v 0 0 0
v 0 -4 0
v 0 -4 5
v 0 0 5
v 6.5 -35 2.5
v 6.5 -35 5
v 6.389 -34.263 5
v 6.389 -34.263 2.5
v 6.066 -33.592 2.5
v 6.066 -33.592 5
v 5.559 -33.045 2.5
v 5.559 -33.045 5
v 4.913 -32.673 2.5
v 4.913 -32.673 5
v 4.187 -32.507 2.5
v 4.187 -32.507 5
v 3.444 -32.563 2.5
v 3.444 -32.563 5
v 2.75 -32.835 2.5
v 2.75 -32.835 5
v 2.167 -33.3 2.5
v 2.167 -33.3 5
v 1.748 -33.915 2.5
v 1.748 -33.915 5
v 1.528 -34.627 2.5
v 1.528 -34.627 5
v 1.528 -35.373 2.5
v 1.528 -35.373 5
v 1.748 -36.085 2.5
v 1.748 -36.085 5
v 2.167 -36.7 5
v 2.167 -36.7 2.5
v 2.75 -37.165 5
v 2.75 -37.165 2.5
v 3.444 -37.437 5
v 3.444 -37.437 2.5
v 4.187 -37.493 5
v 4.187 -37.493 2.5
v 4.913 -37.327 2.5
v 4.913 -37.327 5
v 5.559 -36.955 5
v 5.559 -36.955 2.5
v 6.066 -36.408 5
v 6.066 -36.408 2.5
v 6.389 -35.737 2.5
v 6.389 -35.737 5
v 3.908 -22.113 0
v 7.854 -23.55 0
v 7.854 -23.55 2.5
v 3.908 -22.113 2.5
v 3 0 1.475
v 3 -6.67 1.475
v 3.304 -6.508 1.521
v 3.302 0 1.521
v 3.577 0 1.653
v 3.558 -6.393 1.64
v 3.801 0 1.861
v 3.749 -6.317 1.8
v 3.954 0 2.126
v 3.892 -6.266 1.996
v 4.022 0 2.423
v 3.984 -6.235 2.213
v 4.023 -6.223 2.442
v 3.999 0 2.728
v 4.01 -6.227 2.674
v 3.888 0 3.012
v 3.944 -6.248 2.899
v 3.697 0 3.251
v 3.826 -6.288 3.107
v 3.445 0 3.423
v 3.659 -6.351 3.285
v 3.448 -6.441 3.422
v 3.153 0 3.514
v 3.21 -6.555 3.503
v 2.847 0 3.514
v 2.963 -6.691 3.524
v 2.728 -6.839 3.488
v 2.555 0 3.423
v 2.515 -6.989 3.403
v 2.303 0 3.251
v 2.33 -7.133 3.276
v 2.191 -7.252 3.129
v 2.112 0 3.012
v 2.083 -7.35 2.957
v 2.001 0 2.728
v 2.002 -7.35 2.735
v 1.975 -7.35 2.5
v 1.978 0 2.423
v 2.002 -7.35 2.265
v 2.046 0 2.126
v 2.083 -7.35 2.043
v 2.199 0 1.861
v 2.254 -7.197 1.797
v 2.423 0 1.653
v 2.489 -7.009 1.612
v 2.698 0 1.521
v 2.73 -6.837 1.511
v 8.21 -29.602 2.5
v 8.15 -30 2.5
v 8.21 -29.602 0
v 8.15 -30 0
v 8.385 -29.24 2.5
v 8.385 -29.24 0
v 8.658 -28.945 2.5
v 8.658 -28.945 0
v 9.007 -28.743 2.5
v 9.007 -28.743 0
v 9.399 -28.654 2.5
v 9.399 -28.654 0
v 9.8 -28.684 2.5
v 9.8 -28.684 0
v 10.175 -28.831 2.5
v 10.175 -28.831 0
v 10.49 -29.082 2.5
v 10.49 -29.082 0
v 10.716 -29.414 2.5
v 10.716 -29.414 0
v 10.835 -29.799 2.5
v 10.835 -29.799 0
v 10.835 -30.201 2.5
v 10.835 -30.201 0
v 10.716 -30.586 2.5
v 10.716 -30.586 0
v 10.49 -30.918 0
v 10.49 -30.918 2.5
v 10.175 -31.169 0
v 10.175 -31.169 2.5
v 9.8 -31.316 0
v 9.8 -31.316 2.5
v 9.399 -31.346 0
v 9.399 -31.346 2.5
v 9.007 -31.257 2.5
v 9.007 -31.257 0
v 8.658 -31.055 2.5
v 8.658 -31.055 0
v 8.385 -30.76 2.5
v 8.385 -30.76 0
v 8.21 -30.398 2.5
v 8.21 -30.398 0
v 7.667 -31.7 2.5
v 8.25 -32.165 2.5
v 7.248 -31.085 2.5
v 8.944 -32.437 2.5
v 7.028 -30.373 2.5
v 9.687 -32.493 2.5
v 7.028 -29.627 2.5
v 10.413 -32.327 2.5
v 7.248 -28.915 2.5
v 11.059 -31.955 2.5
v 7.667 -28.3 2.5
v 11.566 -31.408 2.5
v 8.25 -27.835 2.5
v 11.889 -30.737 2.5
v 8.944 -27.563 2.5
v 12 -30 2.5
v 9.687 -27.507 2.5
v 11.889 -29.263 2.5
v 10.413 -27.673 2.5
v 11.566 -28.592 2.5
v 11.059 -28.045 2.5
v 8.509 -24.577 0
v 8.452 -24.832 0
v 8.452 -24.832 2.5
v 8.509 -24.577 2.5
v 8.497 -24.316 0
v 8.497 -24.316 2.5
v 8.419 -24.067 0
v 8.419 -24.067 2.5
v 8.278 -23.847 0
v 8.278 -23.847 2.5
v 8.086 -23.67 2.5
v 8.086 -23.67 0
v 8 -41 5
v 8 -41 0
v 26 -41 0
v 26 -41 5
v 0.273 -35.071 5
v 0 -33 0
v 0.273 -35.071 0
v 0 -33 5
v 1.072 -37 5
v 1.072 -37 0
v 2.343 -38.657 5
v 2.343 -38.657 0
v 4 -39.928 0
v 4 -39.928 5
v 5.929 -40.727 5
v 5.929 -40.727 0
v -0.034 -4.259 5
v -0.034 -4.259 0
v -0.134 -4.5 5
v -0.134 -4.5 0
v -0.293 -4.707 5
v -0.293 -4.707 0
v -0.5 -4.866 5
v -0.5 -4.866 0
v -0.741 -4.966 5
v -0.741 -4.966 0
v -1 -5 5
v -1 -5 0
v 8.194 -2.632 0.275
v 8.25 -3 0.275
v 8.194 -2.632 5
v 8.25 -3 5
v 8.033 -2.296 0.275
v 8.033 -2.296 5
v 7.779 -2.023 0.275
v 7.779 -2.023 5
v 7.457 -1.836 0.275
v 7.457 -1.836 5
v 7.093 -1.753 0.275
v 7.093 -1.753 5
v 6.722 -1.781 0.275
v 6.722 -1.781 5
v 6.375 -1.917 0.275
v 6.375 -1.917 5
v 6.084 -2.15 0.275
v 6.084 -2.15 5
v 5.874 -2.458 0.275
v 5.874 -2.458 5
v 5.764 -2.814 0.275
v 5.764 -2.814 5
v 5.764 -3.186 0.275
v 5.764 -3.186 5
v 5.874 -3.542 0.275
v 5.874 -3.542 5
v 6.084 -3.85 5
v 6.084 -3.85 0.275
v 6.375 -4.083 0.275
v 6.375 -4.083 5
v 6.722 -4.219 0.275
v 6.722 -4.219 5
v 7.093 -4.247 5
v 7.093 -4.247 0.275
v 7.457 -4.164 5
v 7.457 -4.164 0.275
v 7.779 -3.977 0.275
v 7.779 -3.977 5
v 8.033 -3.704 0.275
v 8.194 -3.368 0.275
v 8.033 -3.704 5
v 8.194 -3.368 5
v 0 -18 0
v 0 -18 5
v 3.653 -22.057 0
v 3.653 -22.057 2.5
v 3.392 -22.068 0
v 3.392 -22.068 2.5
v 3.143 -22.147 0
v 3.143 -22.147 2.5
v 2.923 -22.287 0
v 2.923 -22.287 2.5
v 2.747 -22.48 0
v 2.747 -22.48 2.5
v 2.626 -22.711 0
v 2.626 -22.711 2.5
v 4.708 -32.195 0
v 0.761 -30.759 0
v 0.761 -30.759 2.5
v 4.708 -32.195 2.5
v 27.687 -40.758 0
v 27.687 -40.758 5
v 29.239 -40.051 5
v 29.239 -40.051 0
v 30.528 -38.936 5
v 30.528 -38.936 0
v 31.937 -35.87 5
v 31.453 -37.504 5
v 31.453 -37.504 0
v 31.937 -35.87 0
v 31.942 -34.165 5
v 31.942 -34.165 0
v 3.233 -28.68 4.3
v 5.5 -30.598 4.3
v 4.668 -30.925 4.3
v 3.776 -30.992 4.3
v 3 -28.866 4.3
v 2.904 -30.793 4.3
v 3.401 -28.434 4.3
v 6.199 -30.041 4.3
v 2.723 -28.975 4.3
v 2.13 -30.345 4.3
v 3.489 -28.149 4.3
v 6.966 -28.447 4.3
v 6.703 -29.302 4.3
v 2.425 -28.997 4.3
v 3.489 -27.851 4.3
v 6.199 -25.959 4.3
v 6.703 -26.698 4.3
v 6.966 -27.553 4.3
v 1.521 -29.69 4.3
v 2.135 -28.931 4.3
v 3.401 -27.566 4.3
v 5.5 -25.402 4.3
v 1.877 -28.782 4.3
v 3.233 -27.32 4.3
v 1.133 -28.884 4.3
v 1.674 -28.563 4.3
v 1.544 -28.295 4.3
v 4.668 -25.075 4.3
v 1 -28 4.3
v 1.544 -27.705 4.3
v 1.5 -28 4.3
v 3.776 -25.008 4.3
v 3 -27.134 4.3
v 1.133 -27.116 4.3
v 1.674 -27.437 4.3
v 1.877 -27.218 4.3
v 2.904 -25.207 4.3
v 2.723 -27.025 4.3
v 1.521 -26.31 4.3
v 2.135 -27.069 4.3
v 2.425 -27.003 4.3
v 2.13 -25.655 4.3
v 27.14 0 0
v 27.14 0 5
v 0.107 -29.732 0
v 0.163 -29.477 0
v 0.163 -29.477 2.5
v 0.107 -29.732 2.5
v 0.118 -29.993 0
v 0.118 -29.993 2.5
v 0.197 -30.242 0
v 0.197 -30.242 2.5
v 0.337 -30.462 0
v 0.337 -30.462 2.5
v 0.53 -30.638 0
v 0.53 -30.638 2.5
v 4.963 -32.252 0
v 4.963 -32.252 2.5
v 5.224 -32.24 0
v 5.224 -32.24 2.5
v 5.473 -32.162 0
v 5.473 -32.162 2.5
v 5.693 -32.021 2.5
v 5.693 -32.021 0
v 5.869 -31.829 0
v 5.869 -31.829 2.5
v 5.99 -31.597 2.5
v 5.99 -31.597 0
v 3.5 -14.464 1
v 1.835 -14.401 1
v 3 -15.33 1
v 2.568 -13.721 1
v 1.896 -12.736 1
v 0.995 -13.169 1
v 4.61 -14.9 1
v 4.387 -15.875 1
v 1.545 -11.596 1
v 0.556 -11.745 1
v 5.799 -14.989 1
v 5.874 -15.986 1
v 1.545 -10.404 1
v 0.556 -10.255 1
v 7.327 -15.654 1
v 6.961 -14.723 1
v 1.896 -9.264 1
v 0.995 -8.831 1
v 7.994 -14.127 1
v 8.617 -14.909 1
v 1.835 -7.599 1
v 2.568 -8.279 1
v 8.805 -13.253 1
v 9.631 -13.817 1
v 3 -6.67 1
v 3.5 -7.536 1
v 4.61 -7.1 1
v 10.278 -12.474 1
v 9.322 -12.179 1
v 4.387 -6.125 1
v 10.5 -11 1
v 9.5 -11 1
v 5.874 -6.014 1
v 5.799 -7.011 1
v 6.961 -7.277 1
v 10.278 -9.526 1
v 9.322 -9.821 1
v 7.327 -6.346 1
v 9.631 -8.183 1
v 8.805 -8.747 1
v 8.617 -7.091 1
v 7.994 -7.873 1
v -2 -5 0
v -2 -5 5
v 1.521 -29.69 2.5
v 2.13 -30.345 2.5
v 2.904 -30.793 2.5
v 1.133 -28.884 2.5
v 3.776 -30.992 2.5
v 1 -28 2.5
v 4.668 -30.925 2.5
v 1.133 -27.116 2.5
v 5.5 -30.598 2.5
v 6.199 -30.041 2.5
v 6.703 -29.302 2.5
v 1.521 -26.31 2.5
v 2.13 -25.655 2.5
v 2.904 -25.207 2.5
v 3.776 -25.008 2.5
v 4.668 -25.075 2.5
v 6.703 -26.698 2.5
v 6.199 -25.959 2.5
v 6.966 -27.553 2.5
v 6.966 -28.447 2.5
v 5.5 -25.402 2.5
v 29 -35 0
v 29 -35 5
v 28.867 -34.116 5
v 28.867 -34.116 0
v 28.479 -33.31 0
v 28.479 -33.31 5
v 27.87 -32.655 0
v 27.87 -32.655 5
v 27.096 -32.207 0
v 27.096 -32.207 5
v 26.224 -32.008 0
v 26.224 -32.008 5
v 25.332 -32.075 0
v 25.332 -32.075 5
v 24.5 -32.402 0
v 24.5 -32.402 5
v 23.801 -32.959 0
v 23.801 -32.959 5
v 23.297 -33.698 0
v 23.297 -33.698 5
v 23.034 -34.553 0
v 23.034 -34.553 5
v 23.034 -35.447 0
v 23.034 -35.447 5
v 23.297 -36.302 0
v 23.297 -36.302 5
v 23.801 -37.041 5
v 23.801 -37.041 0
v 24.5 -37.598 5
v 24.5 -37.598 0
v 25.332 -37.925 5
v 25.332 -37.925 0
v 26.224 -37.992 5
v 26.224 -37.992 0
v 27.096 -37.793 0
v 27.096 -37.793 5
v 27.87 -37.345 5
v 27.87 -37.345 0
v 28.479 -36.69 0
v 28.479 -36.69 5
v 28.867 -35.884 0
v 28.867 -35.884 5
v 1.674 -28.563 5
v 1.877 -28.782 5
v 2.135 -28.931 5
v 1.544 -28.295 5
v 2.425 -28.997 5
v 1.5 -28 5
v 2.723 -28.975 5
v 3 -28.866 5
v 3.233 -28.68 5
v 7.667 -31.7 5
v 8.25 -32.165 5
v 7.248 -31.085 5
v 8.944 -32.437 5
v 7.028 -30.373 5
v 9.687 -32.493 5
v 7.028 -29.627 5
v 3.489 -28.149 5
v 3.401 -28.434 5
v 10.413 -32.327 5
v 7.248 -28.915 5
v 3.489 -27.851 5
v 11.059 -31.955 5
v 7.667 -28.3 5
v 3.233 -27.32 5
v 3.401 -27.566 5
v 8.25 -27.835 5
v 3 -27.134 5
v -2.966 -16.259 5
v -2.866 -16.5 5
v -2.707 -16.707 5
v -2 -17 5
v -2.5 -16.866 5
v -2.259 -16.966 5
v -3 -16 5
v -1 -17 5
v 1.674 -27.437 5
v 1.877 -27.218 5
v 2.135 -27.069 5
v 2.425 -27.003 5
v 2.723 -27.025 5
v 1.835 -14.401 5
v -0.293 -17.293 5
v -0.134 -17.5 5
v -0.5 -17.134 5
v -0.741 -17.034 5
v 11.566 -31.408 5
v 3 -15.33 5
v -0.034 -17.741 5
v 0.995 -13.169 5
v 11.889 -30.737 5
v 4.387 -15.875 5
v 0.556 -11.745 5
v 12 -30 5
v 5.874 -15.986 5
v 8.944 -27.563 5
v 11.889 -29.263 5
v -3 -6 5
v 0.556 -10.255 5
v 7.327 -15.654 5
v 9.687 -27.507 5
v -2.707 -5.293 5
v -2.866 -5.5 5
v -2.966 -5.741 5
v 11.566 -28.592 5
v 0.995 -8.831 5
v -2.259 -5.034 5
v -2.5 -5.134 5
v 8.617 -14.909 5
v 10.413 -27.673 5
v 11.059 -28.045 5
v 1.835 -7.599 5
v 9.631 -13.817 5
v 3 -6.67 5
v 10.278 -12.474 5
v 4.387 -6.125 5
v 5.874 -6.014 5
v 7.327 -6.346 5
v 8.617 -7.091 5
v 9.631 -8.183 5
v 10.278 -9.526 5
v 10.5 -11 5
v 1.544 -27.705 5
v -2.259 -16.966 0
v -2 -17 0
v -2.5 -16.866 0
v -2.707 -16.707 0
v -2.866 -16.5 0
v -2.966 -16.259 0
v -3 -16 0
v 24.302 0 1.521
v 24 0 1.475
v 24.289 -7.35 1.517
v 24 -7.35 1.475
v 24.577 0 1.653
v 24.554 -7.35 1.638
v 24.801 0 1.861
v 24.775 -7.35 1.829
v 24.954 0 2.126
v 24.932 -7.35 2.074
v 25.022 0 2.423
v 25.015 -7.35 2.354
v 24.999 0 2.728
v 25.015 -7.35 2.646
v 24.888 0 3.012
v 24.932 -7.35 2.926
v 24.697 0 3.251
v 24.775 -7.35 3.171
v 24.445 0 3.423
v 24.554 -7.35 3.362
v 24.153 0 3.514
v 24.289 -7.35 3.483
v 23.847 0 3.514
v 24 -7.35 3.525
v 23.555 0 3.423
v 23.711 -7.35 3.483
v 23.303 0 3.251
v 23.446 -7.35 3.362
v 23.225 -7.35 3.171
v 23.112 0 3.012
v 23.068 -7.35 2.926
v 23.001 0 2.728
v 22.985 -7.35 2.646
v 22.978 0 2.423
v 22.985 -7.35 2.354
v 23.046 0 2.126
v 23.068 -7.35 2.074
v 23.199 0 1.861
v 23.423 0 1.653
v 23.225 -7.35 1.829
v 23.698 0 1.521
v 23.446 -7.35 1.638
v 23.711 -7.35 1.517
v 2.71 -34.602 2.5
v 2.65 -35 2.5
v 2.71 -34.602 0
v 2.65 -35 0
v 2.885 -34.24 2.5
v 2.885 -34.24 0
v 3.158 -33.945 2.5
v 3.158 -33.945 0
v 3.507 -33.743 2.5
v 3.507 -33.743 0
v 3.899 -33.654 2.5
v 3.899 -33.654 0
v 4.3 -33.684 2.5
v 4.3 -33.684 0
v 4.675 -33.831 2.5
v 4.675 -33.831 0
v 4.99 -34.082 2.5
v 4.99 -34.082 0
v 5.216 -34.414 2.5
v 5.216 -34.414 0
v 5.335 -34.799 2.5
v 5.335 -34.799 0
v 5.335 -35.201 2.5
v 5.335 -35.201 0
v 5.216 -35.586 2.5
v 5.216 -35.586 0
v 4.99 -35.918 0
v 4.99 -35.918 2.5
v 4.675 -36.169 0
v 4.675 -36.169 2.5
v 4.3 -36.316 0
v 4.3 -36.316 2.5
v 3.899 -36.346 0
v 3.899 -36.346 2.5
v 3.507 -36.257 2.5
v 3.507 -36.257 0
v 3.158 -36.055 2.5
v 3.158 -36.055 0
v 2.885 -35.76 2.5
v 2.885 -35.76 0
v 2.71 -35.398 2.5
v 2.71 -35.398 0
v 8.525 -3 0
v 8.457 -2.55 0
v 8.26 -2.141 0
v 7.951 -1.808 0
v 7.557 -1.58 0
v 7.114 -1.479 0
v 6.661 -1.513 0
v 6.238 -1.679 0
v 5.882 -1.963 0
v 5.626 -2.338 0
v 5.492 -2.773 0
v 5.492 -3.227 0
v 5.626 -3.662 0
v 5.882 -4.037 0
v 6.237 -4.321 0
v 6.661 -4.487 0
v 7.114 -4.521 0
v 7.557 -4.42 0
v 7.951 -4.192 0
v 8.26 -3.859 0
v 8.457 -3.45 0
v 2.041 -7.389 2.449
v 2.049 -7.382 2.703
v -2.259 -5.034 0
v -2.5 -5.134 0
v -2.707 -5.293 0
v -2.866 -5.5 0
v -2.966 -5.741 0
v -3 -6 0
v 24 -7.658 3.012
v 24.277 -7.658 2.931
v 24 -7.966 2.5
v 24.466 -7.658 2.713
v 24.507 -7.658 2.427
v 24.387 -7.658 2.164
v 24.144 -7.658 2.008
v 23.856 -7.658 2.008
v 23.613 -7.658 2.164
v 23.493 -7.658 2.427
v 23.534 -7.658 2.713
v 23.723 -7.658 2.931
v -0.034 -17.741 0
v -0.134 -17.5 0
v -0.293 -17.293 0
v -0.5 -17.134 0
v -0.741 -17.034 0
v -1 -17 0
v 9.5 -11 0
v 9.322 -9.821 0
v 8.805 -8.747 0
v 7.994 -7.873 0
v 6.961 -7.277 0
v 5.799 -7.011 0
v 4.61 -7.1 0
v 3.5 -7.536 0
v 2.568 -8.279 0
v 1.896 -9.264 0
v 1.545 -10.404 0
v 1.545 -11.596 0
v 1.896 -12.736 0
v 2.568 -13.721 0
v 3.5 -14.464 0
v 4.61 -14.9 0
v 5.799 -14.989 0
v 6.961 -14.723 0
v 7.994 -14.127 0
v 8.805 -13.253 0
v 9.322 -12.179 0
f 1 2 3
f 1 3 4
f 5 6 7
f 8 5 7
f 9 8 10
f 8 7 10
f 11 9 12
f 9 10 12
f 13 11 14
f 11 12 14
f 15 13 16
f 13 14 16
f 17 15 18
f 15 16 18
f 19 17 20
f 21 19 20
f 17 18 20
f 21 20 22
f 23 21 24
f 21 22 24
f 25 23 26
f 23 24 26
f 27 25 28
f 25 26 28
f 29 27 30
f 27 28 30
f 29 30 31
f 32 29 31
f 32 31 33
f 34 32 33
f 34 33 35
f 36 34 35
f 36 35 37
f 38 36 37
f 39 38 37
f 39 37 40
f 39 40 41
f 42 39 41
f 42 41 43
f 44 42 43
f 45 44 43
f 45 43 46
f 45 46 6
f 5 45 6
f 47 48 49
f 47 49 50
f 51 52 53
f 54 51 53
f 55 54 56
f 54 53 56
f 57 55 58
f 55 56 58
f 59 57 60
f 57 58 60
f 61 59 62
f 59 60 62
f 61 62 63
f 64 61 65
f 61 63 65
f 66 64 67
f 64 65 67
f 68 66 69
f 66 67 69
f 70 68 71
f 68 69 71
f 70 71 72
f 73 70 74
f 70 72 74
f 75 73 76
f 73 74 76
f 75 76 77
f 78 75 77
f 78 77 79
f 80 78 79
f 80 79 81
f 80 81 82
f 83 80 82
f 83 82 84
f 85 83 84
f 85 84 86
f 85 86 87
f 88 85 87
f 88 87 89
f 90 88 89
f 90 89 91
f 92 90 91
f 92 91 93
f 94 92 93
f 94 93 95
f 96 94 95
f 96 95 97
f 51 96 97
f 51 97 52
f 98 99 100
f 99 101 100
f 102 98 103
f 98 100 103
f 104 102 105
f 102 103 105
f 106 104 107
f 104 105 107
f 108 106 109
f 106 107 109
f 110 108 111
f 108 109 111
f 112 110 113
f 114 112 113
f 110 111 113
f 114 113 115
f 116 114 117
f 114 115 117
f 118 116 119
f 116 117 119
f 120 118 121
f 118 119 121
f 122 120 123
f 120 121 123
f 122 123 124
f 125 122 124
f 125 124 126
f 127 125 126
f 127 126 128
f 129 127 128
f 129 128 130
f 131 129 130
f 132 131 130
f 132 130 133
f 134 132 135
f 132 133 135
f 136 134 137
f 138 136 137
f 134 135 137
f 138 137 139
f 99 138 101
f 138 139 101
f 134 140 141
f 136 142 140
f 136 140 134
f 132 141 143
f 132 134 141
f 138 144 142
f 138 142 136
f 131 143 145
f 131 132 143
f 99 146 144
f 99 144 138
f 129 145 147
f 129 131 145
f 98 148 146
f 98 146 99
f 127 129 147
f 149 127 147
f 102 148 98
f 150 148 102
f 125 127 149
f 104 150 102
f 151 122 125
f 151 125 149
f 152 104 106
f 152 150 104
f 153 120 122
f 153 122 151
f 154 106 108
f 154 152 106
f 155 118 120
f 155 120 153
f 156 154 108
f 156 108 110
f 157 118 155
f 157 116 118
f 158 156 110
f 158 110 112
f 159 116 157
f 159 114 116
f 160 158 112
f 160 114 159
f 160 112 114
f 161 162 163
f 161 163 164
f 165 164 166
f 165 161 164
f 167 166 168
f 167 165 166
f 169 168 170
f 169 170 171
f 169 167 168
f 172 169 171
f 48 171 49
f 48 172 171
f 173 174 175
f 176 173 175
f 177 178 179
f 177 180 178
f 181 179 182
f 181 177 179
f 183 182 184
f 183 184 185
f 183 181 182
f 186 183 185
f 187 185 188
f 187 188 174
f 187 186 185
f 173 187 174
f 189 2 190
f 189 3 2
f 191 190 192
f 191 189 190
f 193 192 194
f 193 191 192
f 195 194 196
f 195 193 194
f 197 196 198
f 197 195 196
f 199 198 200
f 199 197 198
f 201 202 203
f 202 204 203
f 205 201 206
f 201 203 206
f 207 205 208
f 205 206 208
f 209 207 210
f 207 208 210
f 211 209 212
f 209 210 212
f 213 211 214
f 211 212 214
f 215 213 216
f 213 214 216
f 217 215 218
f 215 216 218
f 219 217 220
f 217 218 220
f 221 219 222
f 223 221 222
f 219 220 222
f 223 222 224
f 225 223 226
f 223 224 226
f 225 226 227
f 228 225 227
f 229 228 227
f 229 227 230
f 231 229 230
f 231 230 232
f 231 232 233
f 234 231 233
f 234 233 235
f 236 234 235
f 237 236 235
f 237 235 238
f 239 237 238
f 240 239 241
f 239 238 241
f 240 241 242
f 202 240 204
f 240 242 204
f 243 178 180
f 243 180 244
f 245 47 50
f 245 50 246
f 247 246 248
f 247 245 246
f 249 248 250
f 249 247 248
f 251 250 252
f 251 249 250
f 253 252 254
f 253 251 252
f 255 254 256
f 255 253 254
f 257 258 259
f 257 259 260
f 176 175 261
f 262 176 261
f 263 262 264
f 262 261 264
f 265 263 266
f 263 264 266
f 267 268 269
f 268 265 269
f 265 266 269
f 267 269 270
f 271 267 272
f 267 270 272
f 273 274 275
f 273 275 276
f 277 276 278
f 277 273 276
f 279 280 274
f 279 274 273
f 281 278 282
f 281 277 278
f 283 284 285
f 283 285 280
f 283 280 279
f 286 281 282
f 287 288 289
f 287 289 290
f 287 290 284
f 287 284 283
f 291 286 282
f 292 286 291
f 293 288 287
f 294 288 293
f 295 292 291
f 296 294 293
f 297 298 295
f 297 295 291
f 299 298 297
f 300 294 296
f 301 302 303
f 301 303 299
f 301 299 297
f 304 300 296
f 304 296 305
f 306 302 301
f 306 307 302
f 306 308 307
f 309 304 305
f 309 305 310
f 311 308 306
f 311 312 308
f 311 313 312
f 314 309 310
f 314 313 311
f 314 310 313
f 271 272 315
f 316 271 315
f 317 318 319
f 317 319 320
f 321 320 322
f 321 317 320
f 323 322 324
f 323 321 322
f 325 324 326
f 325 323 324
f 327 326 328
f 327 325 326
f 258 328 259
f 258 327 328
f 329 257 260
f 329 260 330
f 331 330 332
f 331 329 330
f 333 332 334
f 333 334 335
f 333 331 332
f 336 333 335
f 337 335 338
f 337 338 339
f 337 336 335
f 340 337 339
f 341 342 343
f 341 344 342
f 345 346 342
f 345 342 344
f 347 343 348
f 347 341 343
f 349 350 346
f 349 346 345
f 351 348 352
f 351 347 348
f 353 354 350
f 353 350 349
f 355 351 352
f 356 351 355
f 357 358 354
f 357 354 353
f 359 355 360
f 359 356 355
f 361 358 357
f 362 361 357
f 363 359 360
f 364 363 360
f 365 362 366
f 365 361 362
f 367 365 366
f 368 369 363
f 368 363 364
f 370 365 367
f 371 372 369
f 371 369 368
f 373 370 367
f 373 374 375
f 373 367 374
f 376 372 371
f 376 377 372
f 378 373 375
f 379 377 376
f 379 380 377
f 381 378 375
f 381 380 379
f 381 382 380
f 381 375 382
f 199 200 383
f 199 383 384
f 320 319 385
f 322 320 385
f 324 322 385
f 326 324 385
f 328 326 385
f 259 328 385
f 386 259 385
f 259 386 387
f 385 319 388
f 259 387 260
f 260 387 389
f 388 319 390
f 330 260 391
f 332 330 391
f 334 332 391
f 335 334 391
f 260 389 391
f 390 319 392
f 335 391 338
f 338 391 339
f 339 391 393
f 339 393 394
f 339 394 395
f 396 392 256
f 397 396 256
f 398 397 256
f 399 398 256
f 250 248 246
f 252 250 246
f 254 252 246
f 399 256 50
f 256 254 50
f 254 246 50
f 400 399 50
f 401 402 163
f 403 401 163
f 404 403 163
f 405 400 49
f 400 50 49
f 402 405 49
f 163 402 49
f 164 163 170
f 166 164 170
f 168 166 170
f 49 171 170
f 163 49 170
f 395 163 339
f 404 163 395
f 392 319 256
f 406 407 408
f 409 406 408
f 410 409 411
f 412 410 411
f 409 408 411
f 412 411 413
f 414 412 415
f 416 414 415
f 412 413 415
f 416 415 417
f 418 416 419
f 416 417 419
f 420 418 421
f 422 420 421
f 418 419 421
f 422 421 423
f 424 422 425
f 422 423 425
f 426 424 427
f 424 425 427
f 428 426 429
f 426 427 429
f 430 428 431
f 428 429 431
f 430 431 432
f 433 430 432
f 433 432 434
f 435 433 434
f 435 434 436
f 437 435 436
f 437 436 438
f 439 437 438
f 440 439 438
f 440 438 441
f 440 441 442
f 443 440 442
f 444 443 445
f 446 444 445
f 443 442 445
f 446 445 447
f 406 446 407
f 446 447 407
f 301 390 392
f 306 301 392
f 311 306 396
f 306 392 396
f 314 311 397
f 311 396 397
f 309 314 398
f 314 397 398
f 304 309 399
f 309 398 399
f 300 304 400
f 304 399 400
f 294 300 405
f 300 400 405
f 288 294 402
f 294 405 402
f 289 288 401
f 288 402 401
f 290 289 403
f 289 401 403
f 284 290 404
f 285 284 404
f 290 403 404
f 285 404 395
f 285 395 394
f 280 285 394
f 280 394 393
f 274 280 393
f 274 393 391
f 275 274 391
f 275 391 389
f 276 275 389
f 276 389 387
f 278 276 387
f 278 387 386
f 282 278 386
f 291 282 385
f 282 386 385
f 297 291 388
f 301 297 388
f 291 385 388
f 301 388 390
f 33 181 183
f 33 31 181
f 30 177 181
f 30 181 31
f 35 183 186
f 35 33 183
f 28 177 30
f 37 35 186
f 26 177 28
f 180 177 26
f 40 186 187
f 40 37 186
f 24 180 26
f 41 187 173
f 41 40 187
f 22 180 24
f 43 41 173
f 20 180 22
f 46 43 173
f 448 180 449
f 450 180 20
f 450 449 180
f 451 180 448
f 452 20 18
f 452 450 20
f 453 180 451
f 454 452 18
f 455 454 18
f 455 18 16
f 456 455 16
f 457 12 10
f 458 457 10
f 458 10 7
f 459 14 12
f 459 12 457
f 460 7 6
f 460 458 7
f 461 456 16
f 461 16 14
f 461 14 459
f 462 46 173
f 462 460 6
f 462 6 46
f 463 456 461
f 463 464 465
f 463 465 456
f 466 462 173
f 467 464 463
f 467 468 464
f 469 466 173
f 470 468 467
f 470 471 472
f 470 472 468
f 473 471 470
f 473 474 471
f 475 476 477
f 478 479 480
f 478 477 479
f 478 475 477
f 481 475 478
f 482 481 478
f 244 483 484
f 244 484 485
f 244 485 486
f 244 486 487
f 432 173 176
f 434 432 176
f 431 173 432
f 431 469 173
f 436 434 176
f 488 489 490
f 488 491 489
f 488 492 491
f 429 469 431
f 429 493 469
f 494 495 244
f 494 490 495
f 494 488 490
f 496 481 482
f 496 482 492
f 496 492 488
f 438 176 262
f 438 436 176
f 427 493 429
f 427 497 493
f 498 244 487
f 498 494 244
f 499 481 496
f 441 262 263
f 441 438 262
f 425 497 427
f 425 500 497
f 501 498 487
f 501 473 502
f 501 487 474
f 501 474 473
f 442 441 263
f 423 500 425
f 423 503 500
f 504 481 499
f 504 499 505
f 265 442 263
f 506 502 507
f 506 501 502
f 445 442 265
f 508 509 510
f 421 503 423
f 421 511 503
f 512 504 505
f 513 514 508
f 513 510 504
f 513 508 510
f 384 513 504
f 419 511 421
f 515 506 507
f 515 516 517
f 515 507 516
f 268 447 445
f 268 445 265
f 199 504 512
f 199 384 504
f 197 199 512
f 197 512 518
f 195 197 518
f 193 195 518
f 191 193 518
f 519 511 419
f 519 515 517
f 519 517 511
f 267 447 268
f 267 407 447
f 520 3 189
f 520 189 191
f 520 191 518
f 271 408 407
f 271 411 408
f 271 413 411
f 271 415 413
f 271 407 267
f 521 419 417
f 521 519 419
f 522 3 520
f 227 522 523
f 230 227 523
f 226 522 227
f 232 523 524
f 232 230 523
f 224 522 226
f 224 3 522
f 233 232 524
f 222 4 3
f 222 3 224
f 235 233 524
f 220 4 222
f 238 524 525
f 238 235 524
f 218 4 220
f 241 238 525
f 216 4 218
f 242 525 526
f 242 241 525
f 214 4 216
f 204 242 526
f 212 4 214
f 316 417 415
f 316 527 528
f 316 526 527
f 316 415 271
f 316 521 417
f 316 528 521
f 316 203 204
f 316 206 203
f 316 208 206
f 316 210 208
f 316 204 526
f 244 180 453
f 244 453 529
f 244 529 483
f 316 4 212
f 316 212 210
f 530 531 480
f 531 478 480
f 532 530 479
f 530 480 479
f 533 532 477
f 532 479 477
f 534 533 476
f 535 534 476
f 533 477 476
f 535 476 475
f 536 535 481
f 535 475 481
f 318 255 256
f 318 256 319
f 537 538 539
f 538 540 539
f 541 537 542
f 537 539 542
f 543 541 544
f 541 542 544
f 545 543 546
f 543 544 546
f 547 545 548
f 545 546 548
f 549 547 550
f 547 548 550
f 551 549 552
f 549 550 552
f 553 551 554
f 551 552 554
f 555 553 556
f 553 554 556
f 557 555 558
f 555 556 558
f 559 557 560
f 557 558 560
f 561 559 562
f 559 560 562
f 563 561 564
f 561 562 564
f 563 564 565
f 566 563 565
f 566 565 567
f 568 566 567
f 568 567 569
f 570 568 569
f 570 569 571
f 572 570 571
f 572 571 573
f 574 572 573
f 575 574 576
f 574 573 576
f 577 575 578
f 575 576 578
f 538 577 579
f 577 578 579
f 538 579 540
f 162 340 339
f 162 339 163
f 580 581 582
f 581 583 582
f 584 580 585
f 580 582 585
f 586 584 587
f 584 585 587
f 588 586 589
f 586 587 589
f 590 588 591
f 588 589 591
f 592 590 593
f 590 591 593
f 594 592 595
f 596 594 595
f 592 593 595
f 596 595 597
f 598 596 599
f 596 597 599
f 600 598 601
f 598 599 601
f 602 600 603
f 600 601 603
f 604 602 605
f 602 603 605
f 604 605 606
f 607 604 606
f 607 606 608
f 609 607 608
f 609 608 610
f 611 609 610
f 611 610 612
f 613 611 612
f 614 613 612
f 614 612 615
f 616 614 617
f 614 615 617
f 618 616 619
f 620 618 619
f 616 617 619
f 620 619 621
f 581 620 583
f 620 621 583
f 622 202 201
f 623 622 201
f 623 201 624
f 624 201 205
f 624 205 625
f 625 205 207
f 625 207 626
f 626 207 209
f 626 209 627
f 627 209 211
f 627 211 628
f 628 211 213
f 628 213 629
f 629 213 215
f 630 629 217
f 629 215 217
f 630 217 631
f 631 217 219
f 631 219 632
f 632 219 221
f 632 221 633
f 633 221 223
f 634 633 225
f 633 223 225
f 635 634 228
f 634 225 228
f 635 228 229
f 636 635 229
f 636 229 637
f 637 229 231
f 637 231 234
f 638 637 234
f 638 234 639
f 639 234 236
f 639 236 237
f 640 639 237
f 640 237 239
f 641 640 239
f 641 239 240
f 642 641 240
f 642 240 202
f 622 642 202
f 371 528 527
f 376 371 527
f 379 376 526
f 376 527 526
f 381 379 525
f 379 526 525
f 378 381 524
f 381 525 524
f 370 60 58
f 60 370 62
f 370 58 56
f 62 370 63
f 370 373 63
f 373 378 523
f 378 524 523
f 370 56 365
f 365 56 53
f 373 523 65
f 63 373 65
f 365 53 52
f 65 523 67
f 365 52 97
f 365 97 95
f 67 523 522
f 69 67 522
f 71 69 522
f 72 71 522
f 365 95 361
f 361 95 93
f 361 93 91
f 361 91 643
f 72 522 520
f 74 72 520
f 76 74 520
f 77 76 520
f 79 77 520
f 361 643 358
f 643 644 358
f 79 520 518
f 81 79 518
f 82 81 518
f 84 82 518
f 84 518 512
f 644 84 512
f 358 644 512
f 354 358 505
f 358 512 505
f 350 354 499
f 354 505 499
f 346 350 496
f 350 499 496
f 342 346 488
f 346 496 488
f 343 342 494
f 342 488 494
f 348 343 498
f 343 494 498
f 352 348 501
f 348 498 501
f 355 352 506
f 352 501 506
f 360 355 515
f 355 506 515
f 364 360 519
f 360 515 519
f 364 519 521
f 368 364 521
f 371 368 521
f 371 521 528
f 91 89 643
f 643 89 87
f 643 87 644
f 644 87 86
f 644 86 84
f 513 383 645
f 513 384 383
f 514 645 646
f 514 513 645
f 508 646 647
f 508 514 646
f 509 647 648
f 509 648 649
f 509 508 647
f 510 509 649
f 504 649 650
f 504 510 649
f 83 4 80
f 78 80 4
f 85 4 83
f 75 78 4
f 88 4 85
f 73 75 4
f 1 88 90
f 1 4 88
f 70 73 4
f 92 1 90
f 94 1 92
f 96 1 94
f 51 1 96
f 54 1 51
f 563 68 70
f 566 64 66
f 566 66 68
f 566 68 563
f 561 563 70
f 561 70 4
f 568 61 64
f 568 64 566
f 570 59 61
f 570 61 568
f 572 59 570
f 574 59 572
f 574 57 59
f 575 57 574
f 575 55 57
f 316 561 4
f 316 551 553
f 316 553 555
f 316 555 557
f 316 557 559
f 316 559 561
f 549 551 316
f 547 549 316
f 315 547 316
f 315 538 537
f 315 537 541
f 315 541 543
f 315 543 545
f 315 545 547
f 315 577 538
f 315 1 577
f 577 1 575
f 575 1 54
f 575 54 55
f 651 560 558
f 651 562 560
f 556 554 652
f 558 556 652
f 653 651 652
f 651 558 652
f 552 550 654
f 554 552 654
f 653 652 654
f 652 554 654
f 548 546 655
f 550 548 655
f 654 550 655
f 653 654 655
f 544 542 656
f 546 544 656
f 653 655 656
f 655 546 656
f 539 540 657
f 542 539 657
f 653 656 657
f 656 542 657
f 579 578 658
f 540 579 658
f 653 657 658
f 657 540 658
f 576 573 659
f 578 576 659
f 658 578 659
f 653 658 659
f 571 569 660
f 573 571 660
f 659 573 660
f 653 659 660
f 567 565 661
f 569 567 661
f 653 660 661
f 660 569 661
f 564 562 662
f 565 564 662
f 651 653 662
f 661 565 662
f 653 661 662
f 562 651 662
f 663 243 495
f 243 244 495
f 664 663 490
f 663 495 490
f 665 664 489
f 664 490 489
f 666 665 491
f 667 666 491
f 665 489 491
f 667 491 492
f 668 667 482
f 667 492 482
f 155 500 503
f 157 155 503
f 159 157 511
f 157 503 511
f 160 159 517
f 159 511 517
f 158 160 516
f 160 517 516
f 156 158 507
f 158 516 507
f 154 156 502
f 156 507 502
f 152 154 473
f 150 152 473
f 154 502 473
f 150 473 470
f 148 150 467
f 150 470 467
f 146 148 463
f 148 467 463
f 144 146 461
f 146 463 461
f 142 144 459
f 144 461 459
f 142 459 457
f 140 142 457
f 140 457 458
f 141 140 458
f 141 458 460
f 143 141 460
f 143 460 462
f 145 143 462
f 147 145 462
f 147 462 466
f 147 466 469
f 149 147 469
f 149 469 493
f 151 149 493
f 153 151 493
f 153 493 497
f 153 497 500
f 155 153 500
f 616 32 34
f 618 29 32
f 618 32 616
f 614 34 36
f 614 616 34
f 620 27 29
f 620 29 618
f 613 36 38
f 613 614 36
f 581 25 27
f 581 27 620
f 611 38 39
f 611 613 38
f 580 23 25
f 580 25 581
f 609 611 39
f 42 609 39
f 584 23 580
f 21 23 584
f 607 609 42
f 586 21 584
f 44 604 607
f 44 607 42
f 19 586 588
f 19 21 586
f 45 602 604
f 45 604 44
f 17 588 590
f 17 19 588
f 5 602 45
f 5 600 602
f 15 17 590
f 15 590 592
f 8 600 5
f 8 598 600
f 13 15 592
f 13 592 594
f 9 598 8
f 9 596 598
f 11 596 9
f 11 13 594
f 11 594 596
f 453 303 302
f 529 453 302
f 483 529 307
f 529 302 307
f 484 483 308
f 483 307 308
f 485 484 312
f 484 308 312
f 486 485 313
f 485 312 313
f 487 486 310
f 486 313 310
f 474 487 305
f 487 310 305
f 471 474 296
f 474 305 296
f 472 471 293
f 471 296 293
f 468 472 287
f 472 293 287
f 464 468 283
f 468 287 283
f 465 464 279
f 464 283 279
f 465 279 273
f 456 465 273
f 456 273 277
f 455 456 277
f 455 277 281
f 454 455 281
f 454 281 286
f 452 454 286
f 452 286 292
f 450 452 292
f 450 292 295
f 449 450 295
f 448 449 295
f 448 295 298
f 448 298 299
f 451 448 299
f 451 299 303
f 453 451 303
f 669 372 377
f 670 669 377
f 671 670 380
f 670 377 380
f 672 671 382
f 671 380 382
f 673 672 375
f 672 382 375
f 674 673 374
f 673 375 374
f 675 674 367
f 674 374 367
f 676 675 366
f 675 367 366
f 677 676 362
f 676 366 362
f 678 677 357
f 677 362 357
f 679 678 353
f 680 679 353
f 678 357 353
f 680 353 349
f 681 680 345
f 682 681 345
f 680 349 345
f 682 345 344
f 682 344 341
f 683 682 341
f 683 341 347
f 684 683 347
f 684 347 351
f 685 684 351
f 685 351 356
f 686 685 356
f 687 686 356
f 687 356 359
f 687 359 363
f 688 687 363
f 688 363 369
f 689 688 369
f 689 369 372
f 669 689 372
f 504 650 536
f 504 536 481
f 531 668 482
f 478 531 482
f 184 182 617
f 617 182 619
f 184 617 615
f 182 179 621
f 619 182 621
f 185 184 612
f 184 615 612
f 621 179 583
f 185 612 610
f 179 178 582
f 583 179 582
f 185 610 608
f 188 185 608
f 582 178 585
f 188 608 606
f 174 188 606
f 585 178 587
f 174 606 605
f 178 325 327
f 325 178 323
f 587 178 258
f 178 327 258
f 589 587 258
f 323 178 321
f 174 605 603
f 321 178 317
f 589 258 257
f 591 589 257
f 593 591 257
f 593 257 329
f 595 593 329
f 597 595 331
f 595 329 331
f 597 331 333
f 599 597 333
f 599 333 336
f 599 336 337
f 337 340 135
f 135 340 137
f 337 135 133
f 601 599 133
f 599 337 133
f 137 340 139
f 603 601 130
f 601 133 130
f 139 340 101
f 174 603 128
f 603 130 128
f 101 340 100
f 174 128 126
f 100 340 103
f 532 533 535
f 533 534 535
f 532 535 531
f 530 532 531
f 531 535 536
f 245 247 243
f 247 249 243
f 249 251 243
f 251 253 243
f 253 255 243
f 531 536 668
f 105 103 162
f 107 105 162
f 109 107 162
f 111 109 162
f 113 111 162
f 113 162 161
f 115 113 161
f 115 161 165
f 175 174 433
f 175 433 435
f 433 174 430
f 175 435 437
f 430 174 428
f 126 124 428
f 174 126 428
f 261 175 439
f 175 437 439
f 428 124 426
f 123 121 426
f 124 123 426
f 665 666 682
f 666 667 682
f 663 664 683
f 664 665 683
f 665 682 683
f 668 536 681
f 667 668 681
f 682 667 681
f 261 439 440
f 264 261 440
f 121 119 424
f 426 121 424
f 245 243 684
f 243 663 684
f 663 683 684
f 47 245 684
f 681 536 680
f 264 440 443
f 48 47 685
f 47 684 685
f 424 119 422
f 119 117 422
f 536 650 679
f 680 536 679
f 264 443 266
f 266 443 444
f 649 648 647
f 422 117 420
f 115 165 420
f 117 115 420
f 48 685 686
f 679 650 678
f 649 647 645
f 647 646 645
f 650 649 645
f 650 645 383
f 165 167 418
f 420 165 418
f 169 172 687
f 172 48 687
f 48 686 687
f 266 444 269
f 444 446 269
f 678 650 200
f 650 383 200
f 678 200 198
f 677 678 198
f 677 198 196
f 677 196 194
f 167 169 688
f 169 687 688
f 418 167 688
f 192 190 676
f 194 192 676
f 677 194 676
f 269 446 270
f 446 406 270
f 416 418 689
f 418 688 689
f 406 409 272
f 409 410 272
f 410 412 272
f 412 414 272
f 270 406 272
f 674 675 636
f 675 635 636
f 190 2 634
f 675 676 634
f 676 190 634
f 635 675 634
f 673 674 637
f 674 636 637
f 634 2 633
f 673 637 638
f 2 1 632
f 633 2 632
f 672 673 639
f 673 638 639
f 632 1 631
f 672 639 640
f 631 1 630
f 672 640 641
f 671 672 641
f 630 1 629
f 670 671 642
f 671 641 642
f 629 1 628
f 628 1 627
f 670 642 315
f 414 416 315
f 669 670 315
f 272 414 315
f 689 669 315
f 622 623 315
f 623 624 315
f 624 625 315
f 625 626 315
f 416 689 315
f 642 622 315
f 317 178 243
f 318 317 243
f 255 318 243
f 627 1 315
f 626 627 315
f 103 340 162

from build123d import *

# Parameters (mm, degrees)
SKETCH_1_W                                           = 34
SKETCH_1_H                                           = 41
EXTRUDE_1_DEPTH                                      = 5
FILLET_1_R                                           = 8
SKETCH_2_R                                           = 3
CUT_EXTRUDE_2_DEPTH                                  = 5
SKETCH_3_R                                           = 4
CUT_EXTRUDE_3_DEPTH                                  = 5
SKETCH_4_R                                           = 5
CUT_EXTRUDE_4_DEPTH                                  = 4
HOLE_WIZARD_M2_5_1_D                                 = 2.05
HOLE_WIZARD_M2_5_1_DEPTH                             = 7.35
HOLE_WIZARD_M2_5_1_TIP                               = 0.615882135
CUT_EXTRUDE_5_DEPTH                                  = 5
EXTRUDE1_DEPTH                                       = 5
SKETCH_8_R                                           = 1
CUT_EXTRUDE_6_DEPTH                                  = 5
CUT_EXTRUDE_7_DEPTH                                  = 2.5
SKETCH_10_R                                          = 3
CUT_EXTRUDE_8_DEPTH                                  = 1.8
CBORE_FOR_M2_5_HEXAGON_SOCKET_HEAD_CAP_S_D           = 2.7
CBORE_FOR_M2_5_HEXAGON_SOCKET_HEAD_CAP_S_CBORE_D     = 5
CBORE_FOR_M2_5_HEXAGON_SOCKET_HEAD_CAP_S_CBORE_DEPTH = 2.5
CBORE_FOR_M2_5_HEXAGON_SOCKET_HEAD_C_2_D             = 2.7
CBORE_FOR_M2_5_HEXAGON_SOCKET_HEAD_C_2_CBORE_D       = 5
CBORE_FOR_M2_5_HEXAGON_SOCKET_HEAD_C_2_CBORE_DEPTH   = 2.5
SKETCH_20_W                                          = 5
SKETCH_20_H                                          = 12
EXTRUDE_1_2_DEPTH                                    = 3
FILLET_2_R                                           = 1
M3X0_5_1_D                                           = 2.5
M3X0_5_1_CSINK_D                                     = 3.05
M3X0_5_1_CSINK_ANGLE                                 = 90


with BuildPart() as part:
    # 草图1 → Extrude 1 (new body)
    with BuildSketch(Plane.XY):
        with Locations((17, -20.5)):
            Rectangle(SKETCH_1_W, SKETCH_1_H)
    extrude(amount=EXTRUDE_1_DEPTH)

    # 圆角1
    fillet_1_edges = [part.edges().sort_by_distance(p)[0] for p in [
        (0, -41, 2.5),
    ]]
    fillet(fillet_1_edges, radius=FILLET_1_R)

    # 草图2 → 拉伸2 (cut)
    with BuildSketch(Plane.XY.offset(5)):
        with Locations((26, -35)):
            Circle(SKETCH_2_R)
    extrude(amount=-CUT_EXTRUDE_2_DEPTH, mode=Mode.SUBTRACT)

    # 草图3 → 拉伸3 (cut)
    with BuildSketch(Plane.XY.offset(5)):
        with Locations((5.5, -11)):
            Circle(SKETCH_3_R)
    extrude(amount=-CUT_EXTRUDE_3_DEPTH, mode=Mode.SUBTRACT)

    # 草图4 → 拉伸4 (cut)
    with BuildSketch(Plane.XY.offset(5)):
        with Locations((5.5, -11)):
            Circle(SKETCH_4_R)
    extrude(amount=-CUT_EXTRUDE_4_DEPTH, mode=Mode.SUBTRACT)

    # M2.5 螺纹孔1
    with Locations(Plane(origin=(3, 0, 2.5), x_dir=(0, 0, 1), z_dir=(0, 1, 0))):
        with Locations((0, 0), (0, 21)):
            Hole(HOLE_WIZARD_M2_5_1_D / 2, depth=HOLE_WIZARD_M2_5_1_DEPTH)
            with Locations((0, 0, -(HOLE_WIZARD_M2_5_1_DEPTH + HOLE_WIZARD_M2_5_1_TIP / 2))):  # 118° drill point
                Cone(0, HOLE_WIZARD_M2_5_1_D / 2, HOLE_WIZARD_M2_5_1_TIP, mode=Mode.SUBTRACT)

    # 草图7 → 拉伸5 (cut)
    with BuildSketch(Plane(origin=(0, 0, 0), x_dir=(-1, 0, 0), z_dir=(0, 0, -1))):
        with BuildLine():
            Line((-31.941608412, -34.164961394), (-27.140036221, 0))
            Line((-27.140036221, 0), (-34, 0))
            Line((-34, 0), (-34, -41))
            Line((-34, -41), (-26, -41))
            ThreePointArc((-26, -41), (-30.528257481, -38.936354174), (-31.941608412, -34.164961394))
        make_face()
    extrude(amount=-CUT_EXTRUDE_5_DEPTH, mode=Mode.SUBTRACT)

    # Sketch1 → Extrude1 (add)
    with BuildSketch(Plane(origin=(0, 0, 0), x_dir=(-1, 0, 0), z_dir=(0, 0, -1))):
        with BuildLine():
            Line((-26, -41), (-12, -41))
            ThreePointArc((-12, -41), (-3.514718626, -37.485281374), (0, -29))
            Line((0, -29), (0, -28.019790857))
            Line((0, -28.019790857), (-29.441458618, -39.914912266))
            ThreePointArc((-29.441458618, -39.914912266), (-27.804234797, -40.722301704), (-26, -41))
        make_face()
    extrude(amount=-EXTRUDE1_DEPTH)

    # 草图8 → 拉伸6 (cut)
    with BuildSketch(Plane(origin=(0, 0, 0), x_dir=(-1, 0, 0), z_dir=(0, 0, -1))):
        with Locations((-2.5, -28)):
            Circle(SKETCH_8_R)
    extrude(amount=-CUT_EXTRUDE_6_DEPTH, mode=Mode.SUBTRACT)

    # 草图9 → 拉伸7 (cut)
    with BuildSketch(Plane(origin=(0, 0, 0), x_dir=(-1, 0, 0), z_dir=(0, 0, -1))):
        with BuildLine():
            Line((-0.761170966, -30.758620396), (-4.707879973, -32.195104998))
            ThreePointArc((-4.707879973, -32.195104998), (-5.472518378, -32.161720164), (-5.989592737, -31.59743252))
            Line((-5.989592737, -31.59743252), (-8.452137769, -24.831645651))
            ThreePointArc((-8.452137769, -24.831645651), (-8.418752936, -24.067007246), (-7.854465292, -23.549932887))
            Line((-7.854465292, -23.549932887), (-3.907756285, -22.113448285))
            ThreePointArc((-3.907756285, -22.113448285), (-3.14311788, -22.146833118), (-2.626043521, -22.711120762))
            Line((-2.626043521, -22.711120762), (-0.163498489, -29.476907632))
            ThreePointArc((-0.163498489, -29.476907632), (-0.196883322, -30.241546037), (-0.761170966, -30.758620396))
        make_face()
    extrude(amount=-CUT_EXTRUDE_7_DEPTH, mode=Mode.SUBTRACT)

    # 草图10 → 拉伸8 (cut)
    with BuildSketch(Plane(origin=(0, 0, 2.5), x_dir=(-1, 0, 0), z_dir=(0, 0, -1))):
        with Locations((-4, -28)):
            Circle(SKETCH_10_R)
    extrude(amount=-CUT_EXTRUDE_8_DEPTH, mode=Mode.SUBTRACT)

    # CBORE for M2.5 Hexagon socket head cap s (through all)
    with Locations(Plane(origin=(4, -35, 5), x_dir=(1, 0, 0), z_dir=(0, 0, 1))):
        with Locations((0, 0)):
            CounterBoreHole(CBORE_FOR_M2_5_HEXAGON_SOCKET_HEAD_CAP_S_D / 2, CBORE_FOR_M2_5_HEXAGON_SOCKET_HEAD_CAP_S_CBORE_D / 2, CBORE_FOR_M2_5_HEXAGON_SOCKET_HEAD_CAP_S_CBORE_DEPTH)

    # CBORE for M2.5 Hexagon socket head c 2 (through all)
    with Locations(Plane(origin=(9.5, -30, 5), x_dir=(1, 0, 0), z_dir=(0, 0, 1))):
        with Locations((0, 0)):
            CounterBoreHole(CBORE_FOR_M2_5_HEXAGON_SOCKET_HEAD_C_2_D / 2, CBORE_FOR_M2_5_HEXAGON_SOCKET_HEAD_C_2_CBORE_D / 2, CBORE_FOR_M2_5_HEXAGON_SOCKET_HEAD_C_2_CBORE_DEPTH)

    # 草图20 → Extrude 1 2 (add)
    with BuildSketch(Plane.ZY):
        with Locations((2.5, -11)):
            Rectangle(SKETCH_20_W, SKETCH_20_H)
    extrude(amount=EXTRUDE_1_2_DEPTH)

    # 圆角2
    fillet_2_edges = [part.edges().sort_by_distance(p)[0] for p in [
        (0, -17, 2.5),
        (0, -5, 2.5),
        (-3, -17, 2.5),
        (-3, -5, 2.5),
    ]]
    fillet(fillet_2_edges, radius=FILLET_2_R)

    # M3x0.5 螺纹孔1 (through all)
    with Locations(Plane(origin=(7, -3, 0), x_dir=(-1, 0, 0), z_dir=(0, 0, -1))):
        with Locations((0, 0)):
            CounterSinkHole(M3X0_5_1_D / 2, M3X0_5_1_CSINK_D / 2, counter_sink_angle=M3X0_5_1_CSINK_ANGLE)


solid = part.part
